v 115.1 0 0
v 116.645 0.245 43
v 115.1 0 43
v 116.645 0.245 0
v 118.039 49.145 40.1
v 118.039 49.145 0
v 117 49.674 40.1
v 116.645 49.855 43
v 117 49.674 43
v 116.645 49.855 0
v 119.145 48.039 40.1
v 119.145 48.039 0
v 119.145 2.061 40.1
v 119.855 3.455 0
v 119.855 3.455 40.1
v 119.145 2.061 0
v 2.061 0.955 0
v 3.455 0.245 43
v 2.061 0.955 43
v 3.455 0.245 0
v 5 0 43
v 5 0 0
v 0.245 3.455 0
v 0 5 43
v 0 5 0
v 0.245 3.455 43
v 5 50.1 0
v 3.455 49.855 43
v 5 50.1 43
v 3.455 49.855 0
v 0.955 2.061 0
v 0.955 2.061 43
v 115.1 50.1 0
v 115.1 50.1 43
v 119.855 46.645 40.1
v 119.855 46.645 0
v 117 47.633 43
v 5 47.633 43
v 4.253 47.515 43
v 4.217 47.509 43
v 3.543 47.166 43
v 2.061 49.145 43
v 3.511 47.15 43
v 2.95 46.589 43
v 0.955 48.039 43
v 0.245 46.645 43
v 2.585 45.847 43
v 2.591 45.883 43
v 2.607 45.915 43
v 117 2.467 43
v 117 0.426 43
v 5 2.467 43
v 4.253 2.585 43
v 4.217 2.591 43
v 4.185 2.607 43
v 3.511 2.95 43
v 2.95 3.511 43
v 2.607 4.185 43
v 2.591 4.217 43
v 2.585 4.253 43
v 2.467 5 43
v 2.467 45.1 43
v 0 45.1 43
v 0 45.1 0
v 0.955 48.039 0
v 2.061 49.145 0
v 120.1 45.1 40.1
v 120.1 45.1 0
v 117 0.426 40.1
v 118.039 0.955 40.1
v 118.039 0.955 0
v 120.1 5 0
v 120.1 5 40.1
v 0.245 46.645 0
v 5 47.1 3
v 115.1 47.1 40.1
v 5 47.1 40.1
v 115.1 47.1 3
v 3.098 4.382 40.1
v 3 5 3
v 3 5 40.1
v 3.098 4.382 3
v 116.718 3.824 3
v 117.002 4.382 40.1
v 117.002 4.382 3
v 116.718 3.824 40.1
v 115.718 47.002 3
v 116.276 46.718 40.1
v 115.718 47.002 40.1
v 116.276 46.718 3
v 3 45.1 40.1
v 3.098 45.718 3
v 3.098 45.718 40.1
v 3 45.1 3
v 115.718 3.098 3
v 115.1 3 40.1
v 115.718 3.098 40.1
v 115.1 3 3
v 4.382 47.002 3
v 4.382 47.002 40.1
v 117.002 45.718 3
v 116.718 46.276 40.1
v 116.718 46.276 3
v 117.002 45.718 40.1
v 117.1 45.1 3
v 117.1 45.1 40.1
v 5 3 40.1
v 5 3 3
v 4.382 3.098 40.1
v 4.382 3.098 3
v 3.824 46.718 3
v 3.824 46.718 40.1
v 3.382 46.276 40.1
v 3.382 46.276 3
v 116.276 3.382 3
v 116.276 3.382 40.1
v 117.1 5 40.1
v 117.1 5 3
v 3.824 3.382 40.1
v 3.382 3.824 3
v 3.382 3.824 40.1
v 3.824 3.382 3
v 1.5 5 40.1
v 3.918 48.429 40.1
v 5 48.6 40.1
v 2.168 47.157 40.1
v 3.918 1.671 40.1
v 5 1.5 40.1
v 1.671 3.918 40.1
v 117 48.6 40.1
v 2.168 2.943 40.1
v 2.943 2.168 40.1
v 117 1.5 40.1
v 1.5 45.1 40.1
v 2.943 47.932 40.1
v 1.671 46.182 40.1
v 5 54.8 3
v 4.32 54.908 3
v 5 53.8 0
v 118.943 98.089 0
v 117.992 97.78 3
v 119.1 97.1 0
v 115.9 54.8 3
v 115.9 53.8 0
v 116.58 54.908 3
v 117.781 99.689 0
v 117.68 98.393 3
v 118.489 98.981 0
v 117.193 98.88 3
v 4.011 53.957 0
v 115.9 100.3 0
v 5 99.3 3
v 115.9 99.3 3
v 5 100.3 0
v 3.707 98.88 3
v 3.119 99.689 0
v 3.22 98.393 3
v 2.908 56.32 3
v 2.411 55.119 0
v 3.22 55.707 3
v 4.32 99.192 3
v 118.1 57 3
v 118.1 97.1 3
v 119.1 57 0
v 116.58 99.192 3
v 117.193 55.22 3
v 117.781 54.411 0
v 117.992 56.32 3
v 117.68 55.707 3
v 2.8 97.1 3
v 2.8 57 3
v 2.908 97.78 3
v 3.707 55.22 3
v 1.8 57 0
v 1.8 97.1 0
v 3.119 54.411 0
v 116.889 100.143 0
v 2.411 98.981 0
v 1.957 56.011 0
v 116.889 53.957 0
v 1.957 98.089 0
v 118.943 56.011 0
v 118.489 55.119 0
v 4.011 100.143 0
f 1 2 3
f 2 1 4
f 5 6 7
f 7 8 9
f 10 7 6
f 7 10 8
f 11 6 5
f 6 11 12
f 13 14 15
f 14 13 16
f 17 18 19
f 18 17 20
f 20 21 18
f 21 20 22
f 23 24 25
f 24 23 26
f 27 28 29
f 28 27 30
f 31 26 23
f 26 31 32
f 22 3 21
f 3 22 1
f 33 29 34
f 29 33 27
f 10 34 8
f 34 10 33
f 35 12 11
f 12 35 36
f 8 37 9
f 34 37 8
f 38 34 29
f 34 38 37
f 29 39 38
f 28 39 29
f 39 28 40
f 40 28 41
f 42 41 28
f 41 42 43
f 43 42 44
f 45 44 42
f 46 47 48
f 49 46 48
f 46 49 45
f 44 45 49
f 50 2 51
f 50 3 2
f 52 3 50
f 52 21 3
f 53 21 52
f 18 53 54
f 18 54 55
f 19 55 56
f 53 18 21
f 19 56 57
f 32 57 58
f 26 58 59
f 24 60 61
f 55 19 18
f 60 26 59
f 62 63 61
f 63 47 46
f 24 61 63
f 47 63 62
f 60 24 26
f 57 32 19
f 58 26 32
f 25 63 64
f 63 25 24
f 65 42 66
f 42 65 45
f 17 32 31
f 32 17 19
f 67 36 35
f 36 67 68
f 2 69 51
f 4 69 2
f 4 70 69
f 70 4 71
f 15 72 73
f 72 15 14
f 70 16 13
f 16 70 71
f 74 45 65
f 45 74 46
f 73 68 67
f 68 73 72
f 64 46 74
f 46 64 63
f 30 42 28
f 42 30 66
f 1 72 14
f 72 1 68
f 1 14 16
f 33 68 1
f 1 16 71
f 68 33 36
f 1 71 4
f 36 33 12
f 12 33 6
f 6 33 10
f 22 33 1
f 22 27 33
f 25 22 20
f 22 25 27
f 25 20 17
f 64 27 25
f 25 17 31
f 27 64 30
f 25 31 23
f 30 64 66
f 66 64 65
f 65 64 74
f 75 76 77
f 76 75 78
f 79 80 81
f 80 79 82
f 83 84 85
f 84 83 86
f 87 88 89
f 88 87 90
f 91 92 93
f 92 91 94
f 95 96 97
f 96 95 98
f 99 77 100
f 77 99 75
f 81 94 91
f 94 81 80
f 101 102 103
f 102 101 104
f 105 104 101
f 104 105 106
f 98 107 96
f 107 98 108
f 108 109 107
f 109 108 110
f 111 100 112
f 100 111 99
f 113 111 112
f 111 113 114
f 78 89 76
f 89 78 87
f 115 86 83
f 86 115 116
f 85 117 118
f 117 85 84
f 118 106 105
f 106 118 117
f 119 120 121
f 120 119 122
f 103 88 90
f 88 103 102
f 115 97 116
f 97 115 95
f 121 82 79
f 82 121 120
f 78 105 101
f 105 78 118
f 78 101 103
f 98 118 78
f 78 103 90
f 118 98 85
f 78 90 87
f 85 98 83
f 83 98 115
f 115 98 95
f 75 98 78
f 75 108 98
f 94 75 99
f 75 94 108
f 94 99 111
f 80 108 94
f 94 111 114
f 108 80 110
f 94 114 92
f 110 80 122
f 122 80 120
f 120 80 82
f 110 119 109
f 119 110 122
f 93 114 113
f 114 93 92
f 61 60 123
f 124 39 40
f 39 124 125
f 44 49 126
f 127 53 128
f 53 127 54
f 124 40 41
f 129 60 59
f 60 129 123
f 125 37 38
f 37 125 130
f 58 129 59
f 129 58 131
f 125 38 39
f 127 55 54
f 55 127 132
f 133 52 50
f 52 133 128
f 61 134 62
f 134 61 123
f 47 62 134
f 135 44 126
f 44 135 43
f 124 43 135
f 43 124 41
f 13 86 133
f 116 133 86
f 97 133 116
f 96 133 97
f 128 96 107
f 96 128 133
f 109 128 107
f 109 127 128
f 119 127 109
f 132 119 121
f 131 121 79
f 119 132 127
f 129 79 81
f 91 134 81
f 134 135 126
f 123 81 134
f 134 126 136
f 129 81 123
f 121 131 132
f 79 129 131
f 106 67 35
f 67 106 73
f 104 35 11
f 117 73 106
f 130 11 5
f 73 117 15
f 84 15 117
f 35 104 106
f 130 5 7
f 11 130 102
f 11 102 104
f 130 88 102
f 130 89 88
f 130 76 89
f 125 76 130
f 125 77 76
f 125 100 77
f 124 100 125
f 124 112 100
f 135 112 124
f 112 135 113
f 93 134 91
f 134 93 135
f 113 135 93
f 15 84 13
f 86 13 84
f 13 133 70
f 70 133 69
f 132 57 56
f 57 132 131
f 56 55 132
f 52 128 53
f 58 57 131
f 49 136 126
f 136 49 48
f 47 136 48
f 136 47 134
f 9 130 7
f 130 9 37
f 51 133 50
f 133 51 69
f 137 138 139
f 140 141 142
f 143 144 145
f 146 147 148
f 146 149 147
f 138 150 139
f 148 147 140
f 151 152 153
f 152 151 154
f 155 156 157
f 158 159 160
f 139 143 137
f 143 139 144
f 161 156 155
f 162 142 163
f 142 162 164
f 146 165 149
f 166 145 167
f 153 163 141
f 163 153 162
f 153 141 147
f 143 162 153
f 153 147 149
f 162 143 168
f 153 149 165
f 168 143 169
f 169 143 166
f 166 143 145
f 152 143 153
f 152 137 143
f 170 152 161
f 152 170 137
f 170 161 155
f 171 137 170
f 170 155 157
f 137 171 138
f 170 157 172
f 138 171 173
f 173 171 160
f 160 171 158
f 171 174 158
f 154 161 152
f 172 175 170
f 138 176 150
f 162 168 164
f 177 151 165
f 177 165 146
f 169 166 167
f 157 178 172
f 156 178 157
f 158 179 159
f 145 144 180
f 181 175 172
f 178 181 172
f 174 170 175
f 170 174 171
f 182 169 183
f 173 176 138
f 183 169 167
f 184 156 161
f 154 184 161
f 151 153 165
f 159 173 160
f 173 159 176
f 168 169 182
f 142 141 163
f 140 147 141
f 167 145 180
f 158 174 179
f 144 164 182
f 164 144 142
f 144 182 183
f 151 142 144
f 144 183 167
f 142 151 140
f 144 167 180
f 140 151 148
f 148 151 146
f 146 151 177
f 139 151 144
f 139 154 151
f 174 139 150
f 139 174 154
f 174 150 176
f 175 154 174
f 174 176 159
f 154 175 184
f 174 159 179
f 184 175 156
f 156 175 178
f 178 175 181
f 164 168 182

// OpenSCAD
width = 50;
length = 120;
height = 40;
wall_thickness = 3;
//ensure that the edge roundness is greater than the wall thickness
edge_roundness = 5;
tolerance = 0.3;

$fn = 20;

/* [Hidden] */

//ignore!
inner_box_dimentions = [length,width,height];

difference ()
{

	hull()
	{
		addOutterCorners(0,0);
		addOutterCorners(1,0);
		addOutterCorners(0,1);
		addOutterCorners(1,1);
	}
	
	translate([0,0,wall_thickness])
	hull()
	{
		addInnerCorners(0,0);
		addInnerCorners(1,0);
		addInnerCorners(0,1);
		addInnerCorners(1,1);
	}

	translate([0,0,inner_box_dimentions[2]+0.1])
	hull()
	{
		addLidCorners(0,0);
		addLidCorners(1,0);
		addLidCorners(0,1);
		addLidCorners(1,1);
	}

	translate([inner_box_dimentions[0]-wall_thickness,0,inner_box_dimentions[2]+0.1])
	cube([wall_thickness,inner_box_dimentions[1],wall_thickness]);
}

difference ()
{
	translate([0,inner_box_dimentions[1]+2,0])
	hull()
	{
		Lid(0,0);
		Lid(1,0);
		Lid(0,1);
		Lid(1,1);
	}

	//translate([20,inner_box_dimentions[1]*1.5+2,0])
	//rotate([0,90,0]);

	
}



module addOutterCorners(x = 0, y = 0)
{
	translate([(inner_box_dimentions[0] - edge_roundness*2 + 0.1)*x,(inner_box_dimentions[1] - edge_roundness*2 +0.1)*y,0] + [edge_roundness,edge_roundness,0])

	cylinder(inner_box_dimentions[2]+wall_thickness,edge_roundness,edge_roundness);
	
	echo((inner_box_dimentions[0] - edge_roundness)*x);
	echo((inner_box_dimentions[1] - edge_roundness)*y);
}

module addInnerCorners(x = 0, y = 0)
{
	translate([(inner_box_dimentions[0] - edge_roundness*2 + 0.1)*x,(inner_box_dimentions[1] - edge_roundness*2 +0.1)*y,0] + [edge_roundness,edge_roundness,0])

	cylinder(inner_box_dimentions[2],edge_roundness-wall_thickness,edge_roundness-wall_thickness);
	
	echo((inner_box_dimentions[0] - edge_roundness)*x);
	echo((inner_box_dimentions[1] - edge_roundness)*y);
}

module addLidCorners(x = 0, y = 0)
{
	translate([(inner_box_dimentions[0] - edge_roundness*2 - 0.1 +wall_thickness)*x,(inner_box_dimentions[1] - edge_roundness*2 +0.1)*y,0] + [edge_roundness,edge_roundness,0])

	cylinder(wall_thickness,edge_roundness-wall_thickness+1.5,edge_roundness-wall_thickness+0.5);
	
	echo((inner_box_dimentions[0] - edge_roundness)*x);
	echo((inner_box_dimentions[1] - edge_roundness)*y);
}

module Lid(x = 0, y = 0)
{
	translate([(inner_box_dimentions[0] - edge_roundness*2 - 0.1 +wall_thickness-2)*x,(inner_box_dimentions[1] - edge_roundness*2 +0.1)*y,0] + [edge_roundness,edge_roundness,0])

	cylinder(wall_thickness,edge_roundness-wall_thickness+1.5-tolerance,edge_roundness-wall_thickness+0.5-tolerance);
	
	echo((inner_box_dimentions[0] - edge_roundness)*x);
	echo((inner_box_dimentions[1] - edge_roundness)*y);
}
